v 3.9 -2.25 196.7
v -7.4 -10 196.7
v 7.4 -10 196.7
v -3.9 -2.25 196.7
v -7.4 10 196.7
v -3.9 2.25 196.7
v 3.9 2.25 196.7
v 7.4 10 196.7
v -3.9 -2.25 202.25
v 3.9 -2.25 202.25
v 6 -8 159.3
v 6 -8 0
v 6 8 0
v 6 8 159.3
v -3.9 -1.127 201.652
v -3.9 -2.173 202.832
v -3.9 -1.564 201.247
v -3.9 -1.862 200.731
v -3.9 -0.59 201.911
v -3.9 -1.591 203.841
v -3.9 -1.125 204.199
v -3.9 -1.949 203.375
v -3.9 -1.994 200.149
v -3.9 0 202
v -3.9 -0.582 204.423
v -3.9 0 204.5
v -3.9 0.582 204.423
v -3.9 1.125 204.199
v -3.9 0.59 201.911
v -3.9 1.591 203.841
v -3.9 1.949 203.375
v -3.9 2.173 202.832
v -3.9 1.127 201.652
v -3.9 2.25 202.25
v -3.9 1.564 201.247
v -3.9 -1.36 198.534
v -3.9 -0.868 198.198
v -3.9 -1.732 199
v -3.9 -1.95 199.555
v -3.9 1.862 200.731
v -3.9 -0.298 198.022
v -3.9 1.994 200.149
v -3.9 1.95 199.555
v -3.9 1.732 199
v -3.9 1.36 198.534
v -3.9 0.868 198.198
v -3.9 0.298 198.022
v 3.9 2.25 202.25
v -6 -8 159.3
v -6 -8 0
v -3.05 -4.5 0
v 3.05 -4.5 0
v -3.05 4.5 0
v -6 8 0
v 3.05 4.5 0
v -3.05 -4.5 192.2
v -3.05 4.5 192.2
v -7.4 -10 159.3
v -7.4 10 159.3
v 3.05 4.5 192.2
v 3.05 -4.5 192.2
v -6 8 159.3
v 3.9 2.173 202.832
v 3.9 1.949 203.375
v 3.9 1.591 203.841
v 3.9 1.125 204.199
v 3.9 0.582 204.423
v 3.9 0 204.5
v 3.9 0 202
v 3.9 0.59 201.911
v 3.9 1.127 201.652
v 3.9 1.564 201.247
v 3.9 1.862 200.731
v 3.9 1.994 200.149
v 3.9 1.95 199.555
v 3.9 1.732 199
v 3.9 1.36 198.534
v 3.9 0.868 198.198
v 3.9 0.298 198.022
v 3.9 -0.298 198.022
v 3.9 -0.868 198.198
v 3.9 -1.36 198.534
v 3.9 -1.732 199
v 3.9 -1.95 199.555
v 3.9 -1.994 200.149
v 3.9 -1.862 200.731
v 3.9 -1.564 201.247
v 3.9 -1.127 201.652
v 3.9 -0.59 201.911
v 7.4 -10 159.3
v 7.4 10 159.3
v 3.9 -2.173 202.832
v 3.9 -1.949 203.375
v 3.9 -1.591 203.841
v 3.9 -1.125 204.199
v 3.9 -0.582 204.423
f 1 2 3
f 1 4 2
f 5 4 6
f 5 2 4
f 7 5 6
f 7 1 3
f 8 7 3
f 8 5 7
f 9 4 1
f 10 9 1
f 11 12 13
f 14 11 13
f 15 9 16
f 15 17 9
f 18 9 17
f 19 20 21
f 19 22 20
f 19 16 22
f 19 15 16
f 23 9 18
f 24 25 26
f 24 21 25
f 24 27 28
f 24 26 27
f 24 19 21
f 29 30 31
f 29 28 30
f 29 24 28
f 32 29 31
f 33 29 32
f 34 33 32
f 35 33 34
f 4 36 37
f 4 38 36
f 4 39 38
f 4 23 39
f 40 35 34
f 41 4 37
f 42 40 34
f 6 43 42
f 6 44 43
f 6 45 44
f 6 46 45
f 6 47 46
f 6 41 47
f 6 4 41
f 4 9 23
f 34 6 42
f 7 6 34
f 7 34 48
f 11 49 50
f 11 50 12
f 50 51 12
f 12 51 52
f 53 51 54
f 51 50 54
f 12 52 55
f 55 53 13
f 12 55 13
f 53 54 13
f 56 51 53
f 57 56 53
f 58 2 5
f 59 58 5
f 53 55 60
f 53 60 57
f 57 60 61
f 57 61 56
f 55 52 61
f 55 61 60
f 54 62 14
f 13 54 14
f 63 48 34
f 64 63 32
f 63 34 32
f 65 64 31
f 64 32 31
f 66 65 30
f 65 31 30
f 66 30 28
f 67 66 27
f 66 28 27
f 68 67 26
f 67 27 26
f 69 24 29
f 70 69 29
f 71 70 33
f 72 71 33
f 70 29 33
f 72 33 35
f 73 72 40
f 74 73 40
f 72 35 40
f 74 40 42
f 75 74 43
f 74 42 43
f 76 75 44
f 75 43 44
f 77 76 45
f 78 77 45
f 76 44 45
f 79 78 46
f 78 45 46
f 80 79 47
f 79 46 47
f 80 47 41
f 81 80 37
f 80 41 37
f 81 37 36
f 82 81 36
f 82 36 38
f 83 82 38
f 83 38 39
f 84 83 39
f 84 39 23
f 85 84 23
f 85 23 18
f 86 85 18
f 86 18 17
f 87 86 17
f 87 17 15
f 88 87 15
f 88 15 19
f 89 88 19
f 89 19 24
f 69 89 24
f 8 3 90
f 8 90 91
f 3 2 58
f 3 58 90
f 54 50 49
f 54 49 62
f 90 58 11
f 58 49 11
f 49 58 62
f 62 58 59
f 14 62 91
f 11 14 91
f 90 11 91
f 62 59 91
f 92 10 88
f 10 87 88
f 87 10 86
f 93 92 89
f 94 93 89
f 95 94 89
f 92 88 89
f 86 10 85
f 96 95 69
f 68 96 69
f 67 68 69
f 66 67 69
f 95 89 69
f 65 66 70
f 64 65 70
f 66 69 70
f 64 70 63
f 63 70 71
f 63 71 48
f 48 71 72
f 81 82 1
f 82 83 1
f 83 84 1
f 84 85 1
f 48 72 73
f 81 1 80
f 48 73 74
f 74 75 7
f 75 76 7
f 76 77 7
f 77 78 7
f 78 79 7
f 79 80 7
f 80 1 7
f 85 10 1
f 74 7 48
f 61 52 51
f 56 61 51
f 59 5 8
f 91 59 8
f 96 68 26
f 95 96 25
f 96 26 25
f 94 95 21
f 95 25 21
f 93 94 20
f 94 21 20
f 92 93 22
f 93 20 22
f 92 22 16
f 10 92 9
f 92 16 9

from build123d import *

# Parameters (mm, degrees)
SKETCH1_W           = 12
SKETCH1_H           = 16
BOSS_EXTRUDE1_DEPTH = 159.3
SKETCH2_W           = 14.8
SKETCH2_H           = 20
BOSS_EXTRUDE2_DEPTH = 37.4
SKETCH3_W           = 7.8
SKETCH3_H           = 4.5
BOSS_EXTRUDE3_DEPTH = 7.8
SKETCH4_R           = 2
CUT_EXTRUDE1_DEPTH  = 206.055943586
SKETCH5_W           = 6.1
SKETCH5_H           = 9
CUT_EXTRUDE2_DEPTH  = 192.2


with BuildPart() as part:
    # Sketch1 → Boss-Extrude1 (new body)
    with BuildSketch(Plane.XY):
        Rectangle(SKETCH1_W, SKETCH1_H)
    extrude(amount=BOSS_EXTRUDE1_DEPTH)

    # Sketch2 → Boss-Extrude2 (add)
    with BuildSketch(Plane.XY.offset(159.3)):
        Rectangle(SKETCH2_W, SKETCH2_H)
    extrude(amount=BOSS_EXTRUDE2_DEPTH)

    # Sketch3 → Boss-Extrude3 (add)
    with BuildSketch(Plane.XY.offset(196.7)):
        Rectangle(SKETCH3_W, SKETCH3_H)
    extrude(amount=BOSS_EXTRUDE3_DEPTH)

    # Sketch4 → Cut-Extrude1 (cut, through all)
    with BuildSketch(Plane.ZY.offset(3.9)):
        with Locations((200, 0)):
            Circle(SKETCH4_R)
        with BuildLine():
            Line((202.25, -2.25), (204.5, -2.25))
            Line((204.5, -2.25), (204.5, -3.3e-08))
            ThreePointArc((204.5, -3.3e-08), (203.840990246, -1.590990269), (202.25, -2.25))
        make_face()
        with BuildLine():
            ThreePointArc((202.25, 2.25), (203.840990269, 1.590990246), (204.5, -3.3e-08))
            Line((204.5, -3.3e-08), (204.5, 2.25))
            Line((204.5, 2.25), (202.25, 2.25))
        make_face()
    extrude(amount=-CUT_EXTRUDE1_DEPTH, mode=Mode.SUBTRACT)

    # Sketch5 → Cut-Extrude2 (cut)
    with BuildSketch(Plane(origin=(0, 0, 0), x_dir=(-1, 0, 0), z_dir=(0, 0, -1))):
        Rectangle(SKETCH5_W, SKETCH5_H)
    extrude(amount=-CUT_EXTRUDE2_DEPTH, mode=Mode.SUBTRACT)


solid = part.part
